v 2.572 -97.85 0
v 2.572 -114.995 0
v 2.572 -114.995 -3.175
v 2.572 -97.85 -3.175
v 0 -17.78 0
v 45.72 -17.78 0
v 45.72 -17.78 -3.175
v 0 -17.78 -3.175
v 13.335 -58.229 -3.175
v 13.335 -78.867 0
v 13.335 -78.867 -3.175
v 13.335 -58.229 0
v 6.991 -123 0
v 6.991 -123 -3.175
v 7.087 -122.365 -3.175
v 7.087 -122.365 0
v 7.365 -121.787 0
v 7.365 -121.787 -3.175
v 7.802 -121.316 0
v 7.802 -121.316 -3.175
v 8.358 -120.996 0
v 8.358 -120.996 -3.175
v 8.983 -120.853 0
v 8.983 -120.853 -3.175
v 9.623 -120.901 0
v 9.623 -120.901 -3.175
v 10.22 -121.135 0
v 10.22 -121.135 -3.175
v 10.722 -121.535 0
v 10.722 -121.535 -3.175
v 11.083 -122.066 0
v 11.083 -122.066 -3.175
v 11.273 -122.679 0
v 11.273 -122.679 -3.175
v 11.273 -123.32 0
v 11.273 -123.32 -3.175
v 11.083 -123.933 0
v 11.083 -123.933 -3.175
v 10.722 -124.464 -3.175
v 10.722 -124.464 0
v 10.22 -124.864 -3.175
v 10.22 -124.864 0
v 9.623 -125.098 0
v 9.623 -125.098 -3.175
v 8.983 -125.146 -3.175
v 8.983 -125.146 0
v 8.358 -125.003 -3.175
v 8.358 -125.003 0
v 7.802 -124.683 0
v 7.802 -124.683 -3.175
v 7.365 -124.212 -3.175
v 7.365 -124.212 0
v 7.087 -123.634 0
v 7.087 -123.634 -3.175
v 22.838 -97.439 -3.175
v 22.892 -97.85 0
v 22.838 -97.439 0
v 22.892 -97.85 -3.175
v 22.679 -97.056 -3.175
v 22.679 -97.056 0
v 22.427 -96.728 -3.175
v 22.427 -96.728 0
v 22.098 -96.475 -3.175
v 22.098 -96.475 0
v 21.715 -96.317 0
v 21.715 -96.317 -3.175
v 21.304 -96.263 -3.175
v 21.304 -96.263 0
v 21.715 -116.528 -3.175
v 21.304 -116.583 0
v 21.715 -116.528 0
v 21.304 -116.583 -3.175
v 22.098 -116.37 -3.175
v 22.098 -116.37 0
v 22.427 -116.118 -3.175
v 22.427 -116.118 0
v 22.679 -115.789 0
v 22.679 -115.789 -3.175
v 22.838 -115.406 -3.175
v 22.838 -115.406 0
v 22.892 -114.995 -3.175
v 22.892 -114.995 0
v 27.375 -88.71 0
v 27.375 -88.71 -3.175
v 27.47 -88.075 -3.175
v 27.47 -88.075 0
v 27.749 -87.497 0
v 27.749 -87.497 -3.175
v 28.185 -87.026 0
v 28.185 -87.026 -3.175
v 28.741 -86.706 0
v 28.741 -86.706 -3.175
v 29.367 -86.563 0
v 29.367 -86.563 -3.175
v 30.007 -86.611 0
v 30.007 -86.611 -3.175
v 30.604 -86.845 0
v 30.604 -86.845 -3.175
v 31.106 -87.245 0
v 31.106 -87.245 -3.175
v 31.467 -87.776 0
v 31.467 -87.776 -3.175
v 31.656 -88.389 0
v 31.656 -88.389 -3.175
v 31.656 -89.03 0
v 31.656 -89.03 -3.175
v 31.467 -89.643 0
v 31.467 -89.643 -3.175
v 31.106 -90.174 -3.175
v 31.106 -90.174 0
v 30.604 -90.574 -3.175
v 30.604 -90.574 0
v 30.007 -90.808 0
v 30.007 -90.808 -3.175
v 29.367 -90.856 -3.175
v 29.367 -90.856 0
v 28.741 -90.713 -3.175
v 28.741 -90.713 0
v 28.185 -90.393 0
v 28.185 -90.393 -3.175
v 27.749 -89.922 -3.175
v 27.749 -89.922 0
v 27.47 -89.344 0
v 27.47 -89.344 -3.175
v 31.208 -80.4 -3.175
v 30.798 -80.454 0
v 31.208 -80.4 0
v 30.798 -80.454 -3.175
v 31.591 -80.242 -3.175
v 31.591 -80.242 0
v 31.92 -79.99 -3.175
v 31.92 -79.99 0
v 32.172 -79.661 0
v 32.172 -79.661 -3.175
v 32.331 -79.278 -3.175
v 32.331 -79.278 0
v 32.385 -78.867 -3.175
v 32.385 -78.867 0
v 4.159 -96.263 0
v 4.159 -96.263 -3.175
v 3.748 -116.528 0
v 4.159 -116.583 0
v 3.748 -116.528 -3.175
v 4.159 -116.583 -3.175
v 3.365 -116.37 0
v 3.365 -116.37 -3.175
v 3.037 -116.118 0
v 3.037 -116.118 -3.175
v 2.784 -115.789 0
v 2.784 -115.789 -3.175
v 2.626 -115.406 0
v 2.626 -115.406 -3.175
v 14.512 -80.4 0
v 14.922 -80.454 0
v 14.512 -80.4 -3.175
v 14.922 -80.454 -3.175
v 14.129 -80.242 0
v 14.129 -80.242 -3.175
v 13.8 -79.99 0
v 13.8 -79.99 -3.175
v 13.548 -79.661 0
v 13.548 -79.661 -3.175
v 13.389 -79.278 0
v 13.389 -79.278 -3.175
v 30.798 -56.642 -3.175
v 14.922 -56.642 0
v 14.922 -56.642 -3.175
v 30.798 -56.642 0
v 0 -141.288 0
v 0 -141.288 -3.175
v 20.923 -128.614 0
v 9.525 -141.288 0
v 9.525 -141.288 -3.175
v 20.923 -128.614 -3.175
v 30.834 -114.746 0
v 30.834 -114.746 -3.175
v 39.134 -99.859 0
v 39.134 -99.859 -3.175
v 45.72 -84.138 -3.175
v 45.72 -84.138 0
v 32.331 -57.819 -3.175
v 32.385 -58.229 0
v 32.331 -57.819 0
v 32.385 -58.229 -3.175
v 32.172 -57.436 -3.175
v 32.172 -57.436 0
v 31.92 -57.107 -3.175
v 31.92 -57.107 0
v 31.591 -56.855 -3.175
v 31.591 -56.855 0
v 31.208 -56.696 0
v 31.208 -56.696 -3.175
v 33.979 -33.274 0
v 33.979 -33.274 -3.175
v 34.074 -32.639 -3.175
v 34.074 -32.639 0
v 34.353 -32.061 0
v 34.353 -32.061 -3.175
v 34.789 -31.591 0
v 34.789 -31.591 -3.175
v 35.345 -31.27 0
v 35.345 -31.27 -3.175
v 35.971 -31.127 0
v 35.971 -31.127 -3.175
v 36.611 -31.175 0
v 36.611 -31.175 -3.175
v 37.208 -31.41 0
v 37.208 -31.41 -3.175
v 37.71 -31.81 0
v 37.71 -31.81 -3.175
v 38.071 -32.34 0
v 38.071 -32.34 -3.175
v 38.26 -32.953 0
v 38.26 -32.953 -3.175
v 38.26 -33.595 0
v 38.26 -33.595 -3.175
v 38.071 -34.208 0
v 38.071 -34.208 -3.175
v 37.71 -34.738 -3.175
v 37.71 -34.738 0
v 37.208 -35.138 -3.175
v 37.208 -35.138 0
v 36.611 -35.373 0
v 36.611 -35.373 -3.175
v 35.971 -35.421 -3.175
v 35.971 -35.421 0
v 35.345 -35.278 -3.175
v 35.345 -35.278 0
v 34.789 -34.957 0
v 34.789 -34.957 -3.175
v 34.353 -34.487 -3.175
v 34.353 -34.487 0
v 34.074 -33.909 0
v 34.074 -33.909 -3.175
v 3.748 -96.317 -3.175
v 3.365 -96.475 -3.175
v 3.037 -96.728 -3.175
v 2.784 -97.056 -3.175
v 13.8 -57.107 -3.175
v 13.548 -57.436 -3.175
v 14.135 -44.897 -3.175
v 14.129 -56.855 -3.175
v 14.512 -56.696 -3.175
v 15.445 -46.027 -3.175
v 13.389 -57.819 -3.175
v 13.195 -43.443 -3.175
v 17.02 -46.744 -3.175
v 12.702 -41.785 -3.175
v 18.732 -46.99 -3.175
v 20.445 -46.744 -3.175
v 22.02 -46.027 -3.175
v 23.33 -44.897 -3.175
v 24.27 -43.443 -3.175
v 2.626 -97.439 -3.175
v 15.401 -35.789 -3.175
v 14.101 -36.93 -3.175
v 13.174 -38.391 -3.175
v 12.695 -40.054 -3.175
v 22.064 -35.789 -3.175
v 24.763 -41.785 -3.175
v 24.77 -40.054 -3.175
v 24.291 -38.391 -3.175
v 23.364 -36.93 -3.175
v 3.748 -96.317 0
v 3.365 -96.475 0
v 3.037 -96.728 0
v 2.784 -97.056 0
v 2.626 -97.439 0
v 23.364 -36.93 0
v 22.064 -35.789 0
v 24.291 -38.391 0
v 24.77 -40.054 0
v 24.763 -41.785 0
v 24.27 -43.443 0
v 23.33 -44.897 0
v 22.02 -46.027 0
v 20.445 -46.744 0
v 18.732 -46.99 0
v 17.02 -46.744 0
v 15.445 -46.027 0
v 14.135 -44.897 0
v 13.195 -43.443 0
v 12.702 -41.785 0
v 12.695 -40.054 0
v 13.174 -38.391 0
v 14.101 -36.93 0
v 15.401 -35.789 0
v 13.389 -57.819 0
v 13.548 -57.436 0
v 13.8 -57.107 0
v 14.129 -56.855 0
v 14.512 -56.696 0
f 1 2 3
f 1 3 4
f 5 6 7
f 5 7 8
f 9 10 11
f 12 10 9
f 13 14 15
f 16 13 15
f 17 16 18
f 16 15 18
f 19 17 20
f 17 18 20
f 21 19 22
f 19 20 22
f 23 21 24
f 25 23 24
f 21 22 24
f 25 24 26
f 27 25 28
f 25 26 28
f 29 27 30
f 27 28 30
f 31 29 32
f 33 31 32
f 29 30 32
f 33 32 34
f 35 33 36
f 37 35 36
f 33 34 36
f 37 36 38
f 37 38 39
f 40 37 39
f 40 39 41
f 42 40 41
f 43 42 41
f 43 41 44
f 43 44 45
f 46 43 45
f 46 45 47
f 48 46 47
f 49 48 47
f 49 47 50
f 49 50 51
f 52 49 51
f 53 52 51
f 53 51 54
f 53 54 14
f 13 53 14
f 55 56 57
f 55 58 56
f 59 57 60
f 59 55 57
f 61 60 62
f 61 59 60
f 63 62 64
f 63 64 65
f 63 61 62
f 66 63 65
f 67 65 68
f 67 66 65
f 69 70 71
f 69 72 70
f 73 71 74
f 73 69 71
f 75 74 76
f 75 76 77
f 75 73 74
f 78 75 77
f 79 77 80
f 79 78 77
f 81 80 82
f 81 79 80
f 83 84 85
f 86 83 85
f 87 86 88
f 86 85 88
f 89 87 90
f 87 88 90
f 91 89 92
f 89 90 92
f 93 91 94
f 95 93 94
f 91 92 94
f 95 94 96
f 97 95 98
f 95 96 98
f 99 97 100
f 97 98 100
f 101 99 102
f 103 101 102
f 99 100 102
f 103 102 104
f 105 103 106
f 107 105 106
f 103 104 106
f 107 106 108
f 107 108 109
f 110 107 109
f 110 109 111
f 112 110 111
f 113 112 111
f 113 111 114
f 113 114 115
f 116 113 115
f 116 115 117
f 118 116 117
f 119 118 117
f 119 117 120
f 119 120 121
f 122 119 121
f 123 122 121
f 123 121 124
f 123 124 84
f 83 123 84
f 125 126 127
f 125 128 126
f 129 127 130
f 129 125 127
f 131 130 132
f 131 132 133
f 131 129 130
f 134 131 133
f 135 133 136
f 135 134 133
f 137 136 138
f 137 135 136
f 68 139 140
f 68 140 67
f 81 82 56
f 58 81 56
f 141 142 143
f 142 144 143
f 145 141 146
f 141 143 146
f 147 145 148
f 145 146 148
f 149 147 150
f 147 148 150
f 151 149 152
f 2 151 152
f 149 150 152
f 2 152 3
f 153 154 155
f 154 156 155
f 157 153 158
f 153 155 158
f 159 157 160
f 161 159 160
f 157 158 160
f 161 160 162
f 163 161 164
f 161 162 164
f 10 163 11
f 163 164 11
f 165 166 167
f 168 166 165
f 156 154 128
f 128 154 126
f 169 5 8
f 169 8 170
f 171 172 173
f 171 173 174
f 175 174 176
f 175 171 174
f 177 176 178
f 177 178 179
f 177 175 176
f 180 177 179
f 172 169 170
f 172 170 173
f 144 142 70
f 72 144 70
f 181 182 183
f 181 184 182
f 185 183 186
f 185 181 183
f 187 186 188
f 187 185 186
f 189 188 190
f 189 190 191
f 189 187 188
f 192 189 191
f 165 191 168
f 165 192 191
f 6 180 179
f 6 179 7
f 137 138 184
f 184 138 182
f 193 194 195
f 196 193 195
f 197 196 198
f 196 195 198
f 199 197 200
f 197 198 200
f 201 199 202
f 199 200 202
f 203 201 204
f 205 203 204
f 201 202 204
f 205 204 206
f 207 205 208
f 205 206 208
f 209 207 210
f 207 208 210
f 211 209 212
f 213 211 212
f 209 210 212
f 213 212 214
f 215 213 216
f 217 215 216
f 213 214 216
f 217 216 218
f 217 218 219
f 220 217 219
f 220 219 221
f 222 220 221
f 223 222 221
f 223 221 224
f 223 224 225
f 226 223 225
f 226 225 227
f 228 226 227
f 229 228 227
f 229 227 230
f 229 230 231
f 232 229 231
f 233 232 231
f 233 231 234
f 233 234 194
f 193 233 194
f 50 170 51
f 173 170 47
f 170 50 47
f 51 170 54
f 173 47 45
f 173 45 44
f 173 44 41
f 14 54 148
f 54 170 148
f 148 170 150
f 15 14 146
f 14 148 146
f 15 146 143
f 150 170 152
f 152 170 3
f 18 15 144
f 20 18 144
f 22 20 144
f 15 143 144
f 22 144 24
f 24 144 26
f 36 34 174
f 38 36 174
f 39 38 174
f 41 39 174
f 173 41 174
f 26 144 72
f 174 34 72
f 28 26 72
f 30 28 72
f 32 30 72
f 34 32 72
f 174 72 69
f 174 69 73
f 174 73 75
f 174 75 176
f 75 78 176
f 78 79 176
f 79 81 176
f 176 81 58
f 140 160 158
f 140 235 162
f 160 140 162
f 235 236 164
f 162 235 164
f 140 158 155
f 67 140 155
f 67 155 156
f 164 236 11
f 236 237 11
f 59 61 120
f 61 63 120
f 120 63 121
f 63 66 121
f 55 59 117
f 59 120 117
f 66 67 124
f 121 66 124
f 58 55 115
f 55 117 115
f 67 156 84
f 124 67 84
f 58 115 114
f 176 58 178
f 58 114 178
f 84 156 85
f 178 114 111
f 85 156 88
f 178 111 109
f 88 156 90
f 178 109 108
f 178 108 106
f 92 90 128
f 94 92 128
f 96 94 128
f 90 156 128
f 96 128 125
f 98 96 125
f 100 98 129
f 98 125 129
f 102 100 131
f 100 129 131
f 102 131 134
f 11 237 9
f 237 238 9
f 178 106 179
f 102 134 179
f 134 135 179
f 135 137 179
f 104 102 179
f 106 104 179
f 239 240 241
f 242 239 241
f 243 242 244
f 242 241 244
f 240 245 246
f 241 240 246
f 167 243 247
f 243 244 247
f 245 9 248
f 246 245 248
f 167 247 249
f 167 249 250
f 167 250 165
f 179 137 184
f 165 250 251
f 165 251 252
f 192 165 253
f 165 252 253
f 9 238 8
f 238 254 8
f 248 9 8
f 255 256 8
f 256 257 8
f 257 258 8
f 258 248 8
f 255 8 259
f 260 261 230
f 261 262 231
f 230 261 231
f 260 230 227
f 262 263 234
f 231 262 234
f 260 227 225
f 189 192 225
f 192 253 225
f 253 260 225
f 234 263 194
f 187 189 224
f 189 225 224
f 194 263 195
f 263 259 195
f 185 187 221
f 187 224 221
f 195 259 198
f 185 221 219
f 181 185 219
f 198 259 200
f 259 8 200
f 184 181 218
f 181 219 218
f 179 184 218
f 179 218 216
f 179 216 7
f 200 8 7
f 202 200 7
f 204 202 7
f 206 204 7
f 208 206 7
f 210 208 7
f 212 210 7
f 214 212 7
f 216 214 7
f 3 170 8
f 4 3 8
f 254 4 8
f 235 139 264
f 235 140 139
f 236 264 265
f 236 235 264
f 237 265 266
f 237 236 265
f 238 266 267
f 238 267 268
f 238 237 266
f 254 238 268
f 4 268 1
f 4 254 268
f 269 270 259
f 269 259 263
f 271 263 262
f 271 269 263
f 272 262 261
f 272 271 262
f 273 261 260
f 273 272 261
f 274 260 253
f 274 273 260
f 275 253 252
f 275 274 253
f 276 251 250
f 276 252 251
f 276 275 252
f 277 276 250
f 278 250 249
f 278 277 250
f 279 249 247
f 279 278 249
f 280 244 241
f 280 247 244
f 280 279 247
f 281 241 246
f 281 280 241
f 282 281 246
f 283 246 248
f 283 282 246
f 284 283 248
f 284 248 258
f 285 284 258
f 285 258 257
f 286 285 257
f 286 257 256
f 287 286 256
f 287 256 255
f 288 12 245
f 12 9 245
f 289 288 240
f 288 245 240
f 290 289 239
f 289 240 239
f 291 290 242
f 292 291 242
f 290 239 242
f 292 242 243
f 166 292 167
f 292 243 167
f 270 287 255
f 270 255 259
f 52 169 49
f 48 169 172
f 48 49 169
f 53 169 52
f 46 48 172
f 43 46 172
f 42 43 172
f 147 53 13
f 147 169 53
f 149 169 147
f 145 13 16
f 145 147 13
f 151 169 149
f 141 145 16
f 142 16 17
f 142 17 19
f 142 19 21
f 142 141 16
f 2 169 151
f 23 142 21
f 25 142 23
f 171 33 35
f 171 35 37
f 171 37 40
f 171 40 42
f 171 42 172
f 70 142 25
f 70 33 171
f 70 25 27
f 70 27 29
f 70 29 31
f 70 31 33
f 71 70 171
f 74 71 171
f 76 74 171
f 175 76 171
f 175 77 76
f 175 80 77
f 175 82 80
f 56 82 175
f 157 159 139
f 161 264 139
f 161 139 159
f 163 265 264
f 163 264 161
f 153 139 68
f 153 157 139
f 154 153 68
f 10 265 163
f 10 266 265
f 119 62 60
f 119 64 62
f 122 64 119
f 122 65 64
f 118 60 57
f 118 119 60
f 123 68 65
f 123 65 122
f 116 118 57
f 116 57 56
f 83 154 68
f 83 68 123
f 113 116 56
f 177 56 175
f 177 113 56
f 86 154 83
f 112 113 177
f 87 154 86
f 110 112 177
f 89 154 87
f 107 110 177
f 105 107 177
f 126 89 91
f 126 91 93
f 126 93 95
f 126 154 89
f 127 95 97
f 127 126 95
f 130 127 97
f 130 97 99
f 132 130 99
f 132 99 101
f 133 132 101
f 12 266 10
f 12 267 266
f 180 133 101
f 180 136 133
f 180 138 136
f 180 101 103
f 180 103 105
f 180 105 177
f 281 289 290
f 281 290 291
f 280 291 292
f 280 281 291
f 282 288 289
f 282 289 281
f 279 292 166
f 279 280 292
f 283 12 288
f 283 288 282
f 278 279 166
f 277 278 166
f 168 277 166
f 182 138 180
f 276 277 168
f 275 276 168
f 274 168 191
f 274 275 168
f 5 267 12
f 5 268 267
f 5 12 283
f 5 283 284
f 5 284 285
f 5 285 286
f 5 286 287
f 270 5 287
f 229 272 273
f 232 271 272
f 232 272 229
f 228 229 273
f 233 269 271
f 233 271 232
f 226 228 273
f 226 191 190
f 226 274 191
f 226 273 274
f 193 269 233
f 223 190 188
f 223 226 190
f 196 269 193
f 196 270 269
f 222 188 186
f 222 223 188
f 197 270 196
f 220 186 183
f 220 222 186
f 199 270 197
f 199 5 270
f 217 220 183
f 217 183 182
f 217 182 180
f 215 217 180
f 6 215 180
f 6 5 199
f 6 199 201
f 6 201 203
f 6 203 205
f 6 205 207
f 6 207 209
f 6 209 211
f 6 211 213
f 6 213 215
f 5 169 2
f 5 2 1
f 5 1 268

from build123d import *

# Parameters (mm, degrees)
SKETCH1_R             = 1.190050877
BOSS_EXTRUDE1_DEPTH   = 3.175
CUT_EXTRUDE1_DEPTH    = 4.175
SKETCH12_W            = 19.05
SKETCH12_H            = 23.8125
CUT_EXTRUDE2_DEPTH    = 4.175
SKETCH17_W            = 20.32
SKETCH17_H            = 20.32
CUT_EXTRUDE3_DEPTH    = 4.175
FILLET1_R             = 1.5875
F_6_CLEARANCE_HOLE1_D = 4.3053


with BuildPart() as part:
    # Sketch1 → Boss-Extrude1 (new body)
    with BuildSketch(Plane.XY):
        with BuildLine():
            Line((0, -17.78), (0, -141.2875))
            Line((0, -141.2875), (9.525, -141.2875))
            ThreePointArc((9.525, -141.2875), (30.833523511, -114.746148224), (45.72, -84.1375))
            Line((45.72, -84.1375), (45.72, -17.78))
            Line((45.72, -17.78), (0, -17.78))
        make_face()
        with Locations((18.7325, -40.894)):
            Circle(SKETCH1_R, mode=Mode.SUBTRACT)
    extrude(amount=-BOSS_EXTRUDE1_DEPTH)

    # Sketch11 → Cut-Extrude1 (cut, through all)
    with BuildSketch(Plane(origin=(20.844780046, -43.574770805, 0), x_dir=(1, 0, 0), z_dir=(0, 0, 1))):
        with BuildLine():
            Line((-5.443361979, 7.786170805), (1.218801886, 7.786170805))
            ThreePointArc((1.218801886, 7.786170805), (-2.112280046, -3.415229195), (-5.443361979, 7.786170805))
        make_face()
    extrude(amount=-CUT_EXTRUDE1_DEPTH, mode=Mode.SUBTRACT)

    # Sketch12 → Cut-Extrude2 (cut, through all)
    with BuildSketch(Plane.XY):
        with Locations((22.86, -68.54825)):
            Rectangle(SKETCH12_W, SKETCH12_H)
    extrude(amount=-CUT_EXTRUDE2_DEPTH, mode=Mode.SUBTRACT)

    # Sketch17 → Cut-Extrude3 (cut, through all)
    with BuildSketch(Plane.XY):
        with Locations((12.731722108, -106.422544949)):
            Rectangle(SKETCH17_W, SKETCH17_H)
    extrude(amount=-CUT_EXTRUDE3_DEPTH, mode=Mode.SUBTRACT)

    # Fillet1
    fillet1_edges = [part.edges().sort_by_distance(p)[0] for p in [
        (13.335, -80.4545, -1.5875),
        (13.335, -56.642, -1.5875),
        (32.385, -56.642, -1.5875),
        (32.385, -80.4545, -1.5875),
        (22.891722108, -96.262544949, -1.5875),
        (22.891722108, -116.582544949, -1.5875),
        (2.571722108, -116.582544949, -1.5875),
        (2.571722108, -96.262544949, -1.5875),
    ]]
    fillet(fillet1_edges, radius=FILLET1_R)

    # #6 Clearance Hole1 (through all)
    with Locations(Plane.XY):
        with Locations((9.144, -122.9995), (29.5275, -88.7095), (36.1315, -33.274)):
            Hole(F_6_CLEARANCE_HOLE1_D / 2)


solid = part.part
